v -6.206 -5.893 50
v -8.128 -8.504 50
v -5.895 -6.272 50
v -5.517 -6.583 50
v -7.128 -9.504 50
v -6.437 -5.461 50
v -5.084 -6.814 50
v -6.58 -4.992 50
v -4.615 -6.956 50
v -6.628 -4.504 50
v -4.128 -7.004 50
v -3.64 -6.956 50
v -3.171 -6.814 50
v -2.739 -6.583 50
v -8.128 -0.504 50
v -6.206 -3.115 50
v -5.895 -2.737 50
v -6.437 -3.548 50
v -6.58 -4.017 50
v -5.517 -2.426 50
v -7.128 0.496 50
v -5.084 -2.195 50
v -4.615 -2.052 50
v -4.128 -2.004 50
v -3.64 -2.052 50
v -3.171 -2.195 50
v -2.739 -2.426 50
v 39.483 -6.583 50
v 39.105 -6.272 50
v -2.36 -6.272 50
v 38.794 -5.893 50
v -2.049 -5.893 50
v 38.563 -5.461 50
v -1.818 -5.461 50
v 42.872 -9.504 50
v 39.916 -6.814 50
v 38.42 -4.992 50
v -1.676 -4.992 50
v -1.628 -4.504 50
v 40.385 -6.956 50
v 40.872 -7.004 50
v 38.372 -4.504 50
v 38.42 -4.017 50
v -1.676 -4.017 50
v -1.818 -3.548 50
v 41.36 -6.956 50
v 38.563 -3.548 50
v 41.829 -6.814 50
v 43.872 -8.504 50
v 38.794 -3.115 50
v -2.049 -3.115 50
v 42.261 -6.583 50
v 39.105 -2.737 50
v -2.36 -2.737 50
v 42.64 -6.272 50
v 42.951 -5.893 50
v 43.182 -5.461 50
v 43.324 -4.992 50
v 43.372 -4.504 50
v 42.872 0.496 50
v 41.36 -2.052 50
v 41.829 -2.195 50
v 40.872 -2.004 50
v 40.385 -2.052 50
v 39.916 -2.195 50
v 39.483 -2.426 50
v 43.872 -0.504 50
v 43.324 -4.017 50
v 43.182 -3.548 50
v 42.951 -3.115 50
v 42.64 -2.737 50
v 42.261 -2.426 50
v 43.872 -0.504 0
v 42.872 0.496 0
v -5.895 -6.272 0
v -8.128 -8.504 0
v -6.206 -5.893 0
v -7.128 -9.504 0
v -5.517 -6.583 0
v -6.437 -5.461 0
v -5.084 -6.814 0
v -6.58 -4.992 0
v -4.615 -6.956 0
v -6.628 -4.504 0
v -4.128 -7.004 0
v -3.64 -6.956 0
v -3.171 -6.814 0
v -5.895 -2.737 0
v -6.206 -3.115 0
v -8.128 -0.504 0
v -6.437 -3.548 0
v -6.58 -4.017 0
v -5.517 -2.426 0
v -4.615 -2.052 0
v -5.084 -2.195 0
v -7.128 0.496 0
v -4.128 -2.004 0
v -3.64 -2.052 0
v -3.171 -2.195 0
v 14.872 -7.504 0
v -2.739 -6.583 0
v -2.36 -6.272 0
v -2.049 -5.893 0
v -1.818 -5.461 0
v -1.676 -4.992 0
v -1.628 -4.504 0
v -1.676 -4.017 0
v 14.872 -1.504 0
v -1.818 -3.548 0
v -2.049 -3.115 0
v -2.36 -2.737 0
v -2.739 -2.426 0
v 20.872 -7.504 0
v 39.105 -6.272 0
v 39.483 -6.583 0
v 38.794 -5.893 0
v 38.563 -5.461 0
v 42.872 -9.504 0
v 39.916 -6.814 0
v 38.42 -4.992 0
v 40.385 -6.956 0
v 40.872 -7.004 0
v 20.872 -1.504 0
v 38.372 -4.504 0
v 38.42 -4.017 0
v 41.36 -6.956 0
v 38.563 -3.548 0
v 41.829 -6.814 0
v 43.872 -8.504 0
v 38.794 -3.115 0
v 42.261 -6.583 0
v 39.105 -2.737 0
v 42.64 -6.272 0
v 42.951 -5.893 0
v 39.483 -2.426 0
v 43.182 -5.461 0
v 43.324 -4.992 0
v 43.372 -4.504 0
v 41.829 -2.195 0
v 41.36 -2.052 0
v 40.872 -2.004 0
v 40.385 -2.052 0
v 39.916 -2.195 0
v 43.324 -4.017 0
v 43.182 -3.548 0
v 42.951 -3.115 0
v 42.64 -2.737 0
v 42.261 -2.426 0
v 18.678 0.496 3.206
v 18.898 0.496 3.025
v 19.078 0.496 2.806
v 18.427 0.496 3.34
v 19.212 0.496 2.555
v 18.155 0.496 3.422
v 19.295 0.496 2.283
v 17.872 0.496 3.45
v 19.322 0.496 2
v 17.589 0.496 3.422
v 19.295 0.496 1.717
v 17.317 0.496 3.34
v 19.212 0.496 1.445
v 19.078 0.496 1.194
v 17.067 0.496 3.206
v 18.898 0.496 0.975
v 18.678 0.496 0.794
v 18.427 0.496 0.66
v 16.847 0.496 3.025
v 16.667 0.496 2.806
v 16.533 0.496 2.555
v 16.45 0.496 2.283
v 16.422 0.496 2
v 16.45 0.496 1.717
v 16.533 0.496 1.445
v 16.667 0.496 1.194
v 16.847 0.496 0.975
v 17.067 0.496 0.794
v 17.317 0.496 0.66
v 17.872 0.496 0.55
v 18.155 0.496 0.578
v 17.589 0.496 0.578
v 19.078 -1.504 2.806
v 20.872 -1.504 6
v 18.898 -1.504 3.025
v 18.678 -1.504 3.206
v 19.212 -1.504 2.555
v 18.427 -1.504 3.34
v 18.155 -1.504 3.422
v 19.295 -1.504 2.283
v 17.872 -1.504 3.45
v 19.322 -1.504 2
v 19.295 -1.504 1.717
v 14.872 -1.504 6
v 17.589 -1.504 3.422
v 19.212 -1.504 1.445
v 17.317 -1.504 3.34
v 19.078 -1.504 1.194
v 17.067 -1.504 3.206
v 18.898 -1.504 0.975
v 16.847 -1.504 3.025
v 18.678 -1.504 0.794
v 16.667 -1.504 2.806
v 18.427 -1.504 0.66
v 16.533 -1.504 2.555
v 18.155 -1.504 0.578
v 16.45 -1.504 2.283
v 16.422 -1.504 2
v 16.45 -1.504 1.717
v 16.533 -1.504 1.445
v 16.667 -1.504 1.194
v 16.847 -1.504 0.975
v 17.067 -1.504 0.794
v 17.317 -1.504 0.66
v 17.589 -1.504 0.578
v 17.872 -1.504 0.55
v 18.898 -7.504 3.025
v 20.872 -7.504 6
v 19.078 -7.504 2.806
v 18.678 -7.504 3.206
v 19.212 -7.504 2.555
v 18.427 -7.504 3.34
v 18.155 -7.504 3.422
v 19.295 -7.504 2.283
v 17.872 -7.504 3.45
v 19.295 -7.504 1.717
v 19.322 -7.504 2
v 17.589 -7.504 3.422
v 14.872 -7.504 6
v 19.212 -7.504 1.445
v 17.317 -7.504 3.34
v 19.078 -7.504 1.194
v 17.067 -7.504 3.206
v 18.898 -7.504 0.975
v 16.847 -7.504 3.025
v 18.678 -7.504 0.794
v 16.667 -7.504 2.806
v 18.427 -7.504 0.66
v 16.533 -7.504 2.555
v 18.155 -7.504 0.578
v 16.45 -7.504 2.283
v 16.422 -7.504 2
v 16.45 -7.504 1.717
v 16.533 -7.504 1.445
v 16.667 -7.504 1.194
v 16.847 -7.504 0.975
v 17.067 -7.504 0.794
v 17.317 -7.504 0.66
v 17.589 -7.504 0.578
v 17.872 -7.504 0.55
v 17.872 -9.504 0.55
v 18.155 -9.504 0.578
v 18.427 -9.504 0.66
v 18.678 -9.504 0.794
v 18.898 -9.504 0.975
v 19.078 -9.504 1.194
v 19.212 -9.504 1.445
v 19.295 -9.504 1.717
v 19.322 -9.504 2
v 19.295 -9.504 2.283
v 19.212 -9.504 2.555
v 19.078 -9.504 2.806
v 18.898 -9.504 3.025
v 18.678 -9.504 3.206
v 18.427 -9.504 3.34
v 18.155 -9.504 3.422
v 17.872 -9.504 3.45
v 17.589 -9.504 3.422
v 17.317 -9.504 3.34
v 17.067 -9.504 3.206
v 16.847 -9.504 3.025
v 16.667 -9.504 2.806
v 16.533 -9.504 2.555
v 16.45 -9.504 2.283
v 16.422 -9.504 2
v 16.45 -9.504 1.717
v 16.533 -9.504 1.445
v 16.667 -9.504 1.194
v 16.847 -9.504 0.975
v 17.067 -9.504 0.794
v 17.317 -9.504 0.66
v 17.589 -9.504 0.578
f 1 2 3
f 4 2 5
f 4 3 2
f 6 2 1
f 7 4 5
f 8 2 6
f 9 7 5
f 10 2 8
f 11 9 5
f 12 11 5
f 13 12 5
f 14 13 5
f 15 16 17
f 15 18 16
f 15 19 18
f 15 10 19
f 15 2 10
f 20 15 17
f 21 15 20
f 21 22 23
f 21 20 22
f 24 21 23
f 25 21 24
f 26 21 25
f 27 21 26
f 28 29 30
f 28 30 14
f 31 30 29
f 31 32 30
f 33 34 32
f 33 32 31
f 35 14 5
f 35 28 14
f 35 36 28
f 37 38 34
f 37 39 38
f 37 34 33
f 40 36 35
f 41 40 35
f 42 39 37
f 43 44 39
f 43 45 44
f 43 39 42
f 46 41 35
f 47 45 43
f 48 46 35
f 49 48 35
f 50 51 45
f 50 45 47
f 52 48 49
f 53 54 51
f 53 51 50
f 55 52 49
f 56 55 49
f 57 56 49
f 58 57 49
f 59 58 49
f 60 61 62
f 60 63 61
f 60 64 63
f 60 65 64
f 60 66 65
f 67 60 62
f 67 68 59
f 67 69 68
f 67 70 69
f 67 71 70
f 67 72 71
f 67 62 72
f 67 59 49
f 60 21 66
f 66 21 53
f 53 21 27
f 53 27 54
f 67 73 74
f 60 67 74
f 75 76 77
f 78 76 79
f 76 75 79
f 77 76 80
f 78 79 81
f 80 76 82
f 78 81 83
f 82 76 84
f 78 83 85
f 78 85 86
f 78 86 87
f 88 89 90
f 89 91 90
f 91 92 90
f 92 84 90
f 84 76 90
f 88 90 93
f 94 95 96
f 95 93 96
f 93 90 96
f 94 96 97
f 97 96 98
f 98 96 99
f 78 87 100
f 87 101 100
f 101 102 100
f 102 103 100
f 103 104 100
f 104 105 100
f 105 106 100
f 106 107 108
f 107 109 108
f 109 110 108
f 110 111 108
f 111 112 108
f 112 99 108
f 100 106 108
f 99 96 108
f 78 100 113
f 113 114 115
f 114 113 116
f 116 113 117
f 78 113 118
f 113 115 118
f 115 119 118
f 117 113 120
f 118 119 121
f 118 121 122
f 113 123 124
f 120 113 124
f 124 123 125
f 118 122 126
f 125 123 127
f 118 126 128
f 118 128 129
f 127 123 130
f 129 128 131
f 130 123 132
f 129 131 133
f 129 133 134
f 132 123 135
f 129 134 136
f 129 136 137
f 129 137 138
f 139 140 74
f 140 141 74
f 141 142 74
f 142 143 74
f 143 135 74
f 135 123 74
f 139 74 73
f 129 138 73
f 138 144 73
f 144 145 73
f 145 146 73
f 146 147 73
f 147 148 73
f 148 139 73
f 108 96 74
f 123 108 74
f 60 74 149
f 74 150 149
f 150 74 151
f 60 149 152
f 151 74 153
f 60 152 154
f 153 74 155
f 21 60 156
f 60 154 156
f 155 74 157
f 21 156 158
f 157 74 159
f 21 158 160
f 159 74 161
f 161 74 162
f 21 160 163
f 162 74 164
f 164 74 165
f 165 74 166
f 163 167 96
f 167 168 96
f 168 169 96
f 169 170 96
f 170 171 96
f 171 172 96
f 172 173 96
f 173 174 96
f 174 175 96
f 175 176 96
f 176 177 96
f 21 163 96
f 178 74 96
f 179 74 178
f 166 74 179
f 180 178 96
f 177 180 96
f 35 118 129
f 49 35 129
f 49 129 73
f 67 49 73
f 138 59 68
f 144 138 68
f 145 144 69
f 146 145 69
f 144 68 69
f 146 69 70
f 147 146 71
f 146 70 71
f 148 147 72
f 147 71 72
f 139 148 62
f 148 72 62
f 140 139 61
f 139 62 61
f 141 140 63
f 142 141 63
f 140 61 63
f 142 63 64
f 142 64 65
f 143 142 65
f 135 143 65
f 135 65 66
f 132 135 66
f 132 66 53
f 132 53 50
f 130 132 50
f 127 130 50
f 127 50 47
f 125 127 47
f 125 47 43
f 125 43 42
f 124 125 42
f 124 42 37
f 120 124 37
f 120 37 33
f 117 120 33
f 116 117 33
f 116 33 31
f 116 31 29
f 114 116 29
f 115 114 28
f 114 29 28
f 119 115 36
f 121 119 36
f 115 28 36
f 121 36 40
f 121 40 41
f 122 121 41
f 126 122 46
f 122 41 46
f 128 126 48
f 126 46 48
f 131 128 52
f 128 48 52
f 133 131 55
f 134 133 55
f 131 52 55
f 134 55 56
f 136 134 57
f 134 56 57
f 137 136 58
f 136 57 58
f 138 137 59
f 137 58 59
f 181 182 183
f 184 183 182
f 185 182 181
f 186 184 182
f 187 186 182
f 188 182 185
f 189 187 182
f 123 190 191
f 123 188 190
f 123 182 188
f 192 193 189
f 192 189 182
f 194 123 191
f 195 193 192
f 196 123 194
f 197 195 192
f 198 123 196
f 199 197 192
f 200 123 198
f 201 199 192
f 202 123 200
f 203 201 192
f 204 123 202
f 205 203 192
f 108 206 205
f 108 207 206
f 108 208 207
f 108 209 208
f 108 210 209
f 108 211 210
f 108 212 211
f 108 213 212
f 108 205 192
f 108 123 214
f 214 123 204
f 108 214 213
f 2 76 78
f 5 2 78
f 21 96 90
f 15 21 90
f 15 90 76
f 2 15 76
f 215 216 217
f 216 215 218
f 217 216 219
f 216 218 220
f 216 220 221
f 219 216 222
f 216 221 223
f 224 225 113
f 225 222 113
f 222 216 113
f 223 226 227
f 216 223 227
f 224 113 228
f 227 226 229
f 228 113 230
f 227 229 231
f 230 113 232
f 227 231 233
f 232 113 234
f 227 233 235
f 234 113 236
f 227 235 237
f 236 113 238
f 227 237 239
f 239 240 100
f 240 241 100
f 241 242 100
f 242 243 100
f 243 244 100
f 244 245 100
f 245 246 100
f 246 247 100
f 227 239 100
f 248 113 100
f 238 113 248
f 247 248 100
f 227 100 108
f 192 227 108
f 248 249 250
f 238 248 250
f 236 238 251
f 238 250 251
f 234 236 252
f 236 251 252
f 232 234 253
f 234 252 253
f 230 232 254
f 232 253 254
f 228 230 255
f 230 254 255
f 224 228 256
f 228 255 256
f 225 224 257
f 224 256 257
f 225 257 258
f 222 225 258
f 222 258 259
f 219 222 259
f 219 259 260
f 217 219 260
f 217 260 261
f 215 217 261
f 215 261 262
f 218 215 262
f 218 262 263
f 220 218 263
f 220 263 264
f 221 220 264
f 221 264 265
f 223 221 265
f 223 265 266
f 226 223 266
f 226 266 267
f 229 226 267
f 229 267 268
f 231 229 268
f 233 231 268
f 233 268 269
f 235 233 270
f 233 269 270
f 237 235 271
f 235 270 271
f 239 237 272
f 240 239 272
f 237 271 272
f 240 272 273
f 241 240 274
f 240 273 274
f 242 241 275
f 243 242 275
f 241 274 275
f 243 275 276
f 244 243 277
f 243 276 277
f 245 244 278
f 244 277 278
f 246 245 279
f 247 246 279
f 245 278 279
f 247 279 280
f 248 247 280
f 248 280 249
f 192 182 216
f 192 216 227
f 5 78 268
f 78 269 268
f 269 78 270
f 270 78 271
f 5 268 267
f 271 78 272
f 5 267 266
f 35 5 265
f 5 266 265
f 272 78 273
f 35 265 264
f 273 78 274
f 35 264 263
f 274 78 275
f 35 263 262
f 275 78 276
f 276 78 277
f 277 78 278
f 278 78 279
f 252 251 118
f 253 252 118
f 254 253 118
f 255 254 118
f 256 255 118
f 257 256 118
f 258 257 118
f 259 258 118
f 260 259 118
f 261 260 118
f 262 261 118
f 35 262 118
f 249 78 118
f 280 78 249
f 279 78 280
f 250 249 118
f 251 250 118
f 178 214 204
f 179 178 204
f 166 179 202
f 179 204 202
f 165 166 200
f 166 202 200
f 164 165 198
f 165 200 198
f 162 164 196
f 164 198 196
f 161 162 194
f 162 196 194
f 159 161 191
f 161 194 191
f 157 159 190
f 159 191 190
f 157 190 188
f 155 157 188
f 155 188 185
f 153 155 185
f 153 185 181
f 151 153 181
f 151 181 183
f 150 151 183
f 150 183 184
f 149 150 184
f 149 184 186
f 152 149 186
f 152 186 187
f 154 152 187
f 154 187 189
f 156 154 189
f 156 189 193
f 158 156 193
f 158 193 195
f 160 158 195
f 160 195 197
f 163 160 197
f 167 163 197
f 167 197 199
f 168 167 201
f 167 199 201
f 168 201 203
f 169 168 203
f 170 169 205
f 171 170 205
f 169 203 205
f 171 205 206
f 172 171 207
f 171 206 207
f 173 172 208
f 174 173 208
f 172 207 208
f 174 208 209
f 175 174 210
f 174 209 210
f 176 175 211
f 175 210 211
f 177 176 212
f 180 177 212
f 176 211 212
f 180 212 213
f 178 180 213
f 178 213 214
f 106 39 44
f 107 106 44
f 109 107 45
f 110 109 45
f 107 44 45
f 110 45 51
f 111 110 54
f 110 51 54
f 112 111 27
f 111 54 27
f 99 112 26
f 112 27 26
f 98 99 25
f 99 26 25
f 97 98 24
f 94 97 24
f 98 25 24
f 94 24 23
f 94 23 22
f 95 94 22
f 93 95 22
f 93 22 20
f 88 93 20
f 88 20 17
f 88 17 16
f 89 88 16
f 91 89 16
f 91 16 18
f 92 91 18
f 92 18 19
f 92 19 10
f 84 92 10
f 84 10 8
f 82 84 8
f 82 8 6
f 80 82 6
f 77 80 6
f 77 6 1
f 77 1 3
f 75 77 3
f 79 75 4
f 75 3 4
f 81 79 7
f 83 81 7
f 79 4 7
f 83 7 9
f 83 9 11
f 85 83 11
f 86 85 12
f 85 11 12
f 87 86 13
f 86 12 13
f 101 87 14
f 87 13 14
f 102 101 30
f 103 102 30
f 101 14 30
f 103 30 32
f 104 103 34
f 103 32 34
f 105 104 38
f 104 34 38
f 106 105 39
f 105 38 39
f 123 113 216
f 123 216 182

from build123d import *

# Parameters (mm, degrees)
BOSS_EXTRUDE1_DEPTH = 50
SKETCH2_R           = 2.5
CUT_EXTRUDE1_DEPTH  = 68.194635476
SKETCH3_R           = 1.45
CUT_EXTRUDE2_DEPTH  = 68.26652433
SKETCH4_W           = 6
SKETCH4_H           = 6
CUT_EXTRUDE4_DEPTH  = 6


with BuildPart() as part:
    # Sketch1 → Boss-Extrude1 (new body)
    with BuildSketch(Plane.XY):
        Polygon((42.872375084, -9.504406412), (43.872375084, -8.504406412), (43.872375084, -0.504406412), (42.872375084, 0.495593588), (-7.127624916, 0.495593588), (-8.127624916, -0.504406412), (-8.127624916, -8.504406412), (-7.127624916, -9.504406412), align=None)
    extrude(amount=BOSS_EXTRUDE1_DEPTH)

    # Sketch2 → Cut-Extrude1 (cut, through all)
    with BuildSketch(Plane.XY.offset(50)):
        with Locations((-4.127624916, -4.504406412)):
            Circle(SKETCH2_R)
        with Locations((40.872375084, -4.504406412)):
            Circle(SKETCH2_R)
    extrude(amount=-CUT_EXTRUDE1_DEPTH, mode=Mode.SUBTRACT)

    # Sketch3 → Cut-Extrude2 (cut, through all)
    with BuildSketch(Plane.XZ.offset(9.504406412)):
        with Locations(Location((17.872375084, 2, 0), (0, 0, 270))):
            Circle(SKETCH3_R)
    extrude(amount=-CUT_EXTRUDE2_DEPTH, mode=Mode.SUBTRACT)

    # Sketch4 → Cut-Extrude4 (cut)
    with BuildSketch(Plane(origin=(0, 0, 0), x_dir=(-1, 0, 0), z_dir=(0, 0, -1))):
        with Locations((-17.872375084, -4.504406412)):
            Rectangle(SKETCH4_W, SKETCH4_H)
    extrude(amount=-CUT_EXTRUDE4_DEPTH, mode=Mode.SUBTRACT)


solid = part.part
